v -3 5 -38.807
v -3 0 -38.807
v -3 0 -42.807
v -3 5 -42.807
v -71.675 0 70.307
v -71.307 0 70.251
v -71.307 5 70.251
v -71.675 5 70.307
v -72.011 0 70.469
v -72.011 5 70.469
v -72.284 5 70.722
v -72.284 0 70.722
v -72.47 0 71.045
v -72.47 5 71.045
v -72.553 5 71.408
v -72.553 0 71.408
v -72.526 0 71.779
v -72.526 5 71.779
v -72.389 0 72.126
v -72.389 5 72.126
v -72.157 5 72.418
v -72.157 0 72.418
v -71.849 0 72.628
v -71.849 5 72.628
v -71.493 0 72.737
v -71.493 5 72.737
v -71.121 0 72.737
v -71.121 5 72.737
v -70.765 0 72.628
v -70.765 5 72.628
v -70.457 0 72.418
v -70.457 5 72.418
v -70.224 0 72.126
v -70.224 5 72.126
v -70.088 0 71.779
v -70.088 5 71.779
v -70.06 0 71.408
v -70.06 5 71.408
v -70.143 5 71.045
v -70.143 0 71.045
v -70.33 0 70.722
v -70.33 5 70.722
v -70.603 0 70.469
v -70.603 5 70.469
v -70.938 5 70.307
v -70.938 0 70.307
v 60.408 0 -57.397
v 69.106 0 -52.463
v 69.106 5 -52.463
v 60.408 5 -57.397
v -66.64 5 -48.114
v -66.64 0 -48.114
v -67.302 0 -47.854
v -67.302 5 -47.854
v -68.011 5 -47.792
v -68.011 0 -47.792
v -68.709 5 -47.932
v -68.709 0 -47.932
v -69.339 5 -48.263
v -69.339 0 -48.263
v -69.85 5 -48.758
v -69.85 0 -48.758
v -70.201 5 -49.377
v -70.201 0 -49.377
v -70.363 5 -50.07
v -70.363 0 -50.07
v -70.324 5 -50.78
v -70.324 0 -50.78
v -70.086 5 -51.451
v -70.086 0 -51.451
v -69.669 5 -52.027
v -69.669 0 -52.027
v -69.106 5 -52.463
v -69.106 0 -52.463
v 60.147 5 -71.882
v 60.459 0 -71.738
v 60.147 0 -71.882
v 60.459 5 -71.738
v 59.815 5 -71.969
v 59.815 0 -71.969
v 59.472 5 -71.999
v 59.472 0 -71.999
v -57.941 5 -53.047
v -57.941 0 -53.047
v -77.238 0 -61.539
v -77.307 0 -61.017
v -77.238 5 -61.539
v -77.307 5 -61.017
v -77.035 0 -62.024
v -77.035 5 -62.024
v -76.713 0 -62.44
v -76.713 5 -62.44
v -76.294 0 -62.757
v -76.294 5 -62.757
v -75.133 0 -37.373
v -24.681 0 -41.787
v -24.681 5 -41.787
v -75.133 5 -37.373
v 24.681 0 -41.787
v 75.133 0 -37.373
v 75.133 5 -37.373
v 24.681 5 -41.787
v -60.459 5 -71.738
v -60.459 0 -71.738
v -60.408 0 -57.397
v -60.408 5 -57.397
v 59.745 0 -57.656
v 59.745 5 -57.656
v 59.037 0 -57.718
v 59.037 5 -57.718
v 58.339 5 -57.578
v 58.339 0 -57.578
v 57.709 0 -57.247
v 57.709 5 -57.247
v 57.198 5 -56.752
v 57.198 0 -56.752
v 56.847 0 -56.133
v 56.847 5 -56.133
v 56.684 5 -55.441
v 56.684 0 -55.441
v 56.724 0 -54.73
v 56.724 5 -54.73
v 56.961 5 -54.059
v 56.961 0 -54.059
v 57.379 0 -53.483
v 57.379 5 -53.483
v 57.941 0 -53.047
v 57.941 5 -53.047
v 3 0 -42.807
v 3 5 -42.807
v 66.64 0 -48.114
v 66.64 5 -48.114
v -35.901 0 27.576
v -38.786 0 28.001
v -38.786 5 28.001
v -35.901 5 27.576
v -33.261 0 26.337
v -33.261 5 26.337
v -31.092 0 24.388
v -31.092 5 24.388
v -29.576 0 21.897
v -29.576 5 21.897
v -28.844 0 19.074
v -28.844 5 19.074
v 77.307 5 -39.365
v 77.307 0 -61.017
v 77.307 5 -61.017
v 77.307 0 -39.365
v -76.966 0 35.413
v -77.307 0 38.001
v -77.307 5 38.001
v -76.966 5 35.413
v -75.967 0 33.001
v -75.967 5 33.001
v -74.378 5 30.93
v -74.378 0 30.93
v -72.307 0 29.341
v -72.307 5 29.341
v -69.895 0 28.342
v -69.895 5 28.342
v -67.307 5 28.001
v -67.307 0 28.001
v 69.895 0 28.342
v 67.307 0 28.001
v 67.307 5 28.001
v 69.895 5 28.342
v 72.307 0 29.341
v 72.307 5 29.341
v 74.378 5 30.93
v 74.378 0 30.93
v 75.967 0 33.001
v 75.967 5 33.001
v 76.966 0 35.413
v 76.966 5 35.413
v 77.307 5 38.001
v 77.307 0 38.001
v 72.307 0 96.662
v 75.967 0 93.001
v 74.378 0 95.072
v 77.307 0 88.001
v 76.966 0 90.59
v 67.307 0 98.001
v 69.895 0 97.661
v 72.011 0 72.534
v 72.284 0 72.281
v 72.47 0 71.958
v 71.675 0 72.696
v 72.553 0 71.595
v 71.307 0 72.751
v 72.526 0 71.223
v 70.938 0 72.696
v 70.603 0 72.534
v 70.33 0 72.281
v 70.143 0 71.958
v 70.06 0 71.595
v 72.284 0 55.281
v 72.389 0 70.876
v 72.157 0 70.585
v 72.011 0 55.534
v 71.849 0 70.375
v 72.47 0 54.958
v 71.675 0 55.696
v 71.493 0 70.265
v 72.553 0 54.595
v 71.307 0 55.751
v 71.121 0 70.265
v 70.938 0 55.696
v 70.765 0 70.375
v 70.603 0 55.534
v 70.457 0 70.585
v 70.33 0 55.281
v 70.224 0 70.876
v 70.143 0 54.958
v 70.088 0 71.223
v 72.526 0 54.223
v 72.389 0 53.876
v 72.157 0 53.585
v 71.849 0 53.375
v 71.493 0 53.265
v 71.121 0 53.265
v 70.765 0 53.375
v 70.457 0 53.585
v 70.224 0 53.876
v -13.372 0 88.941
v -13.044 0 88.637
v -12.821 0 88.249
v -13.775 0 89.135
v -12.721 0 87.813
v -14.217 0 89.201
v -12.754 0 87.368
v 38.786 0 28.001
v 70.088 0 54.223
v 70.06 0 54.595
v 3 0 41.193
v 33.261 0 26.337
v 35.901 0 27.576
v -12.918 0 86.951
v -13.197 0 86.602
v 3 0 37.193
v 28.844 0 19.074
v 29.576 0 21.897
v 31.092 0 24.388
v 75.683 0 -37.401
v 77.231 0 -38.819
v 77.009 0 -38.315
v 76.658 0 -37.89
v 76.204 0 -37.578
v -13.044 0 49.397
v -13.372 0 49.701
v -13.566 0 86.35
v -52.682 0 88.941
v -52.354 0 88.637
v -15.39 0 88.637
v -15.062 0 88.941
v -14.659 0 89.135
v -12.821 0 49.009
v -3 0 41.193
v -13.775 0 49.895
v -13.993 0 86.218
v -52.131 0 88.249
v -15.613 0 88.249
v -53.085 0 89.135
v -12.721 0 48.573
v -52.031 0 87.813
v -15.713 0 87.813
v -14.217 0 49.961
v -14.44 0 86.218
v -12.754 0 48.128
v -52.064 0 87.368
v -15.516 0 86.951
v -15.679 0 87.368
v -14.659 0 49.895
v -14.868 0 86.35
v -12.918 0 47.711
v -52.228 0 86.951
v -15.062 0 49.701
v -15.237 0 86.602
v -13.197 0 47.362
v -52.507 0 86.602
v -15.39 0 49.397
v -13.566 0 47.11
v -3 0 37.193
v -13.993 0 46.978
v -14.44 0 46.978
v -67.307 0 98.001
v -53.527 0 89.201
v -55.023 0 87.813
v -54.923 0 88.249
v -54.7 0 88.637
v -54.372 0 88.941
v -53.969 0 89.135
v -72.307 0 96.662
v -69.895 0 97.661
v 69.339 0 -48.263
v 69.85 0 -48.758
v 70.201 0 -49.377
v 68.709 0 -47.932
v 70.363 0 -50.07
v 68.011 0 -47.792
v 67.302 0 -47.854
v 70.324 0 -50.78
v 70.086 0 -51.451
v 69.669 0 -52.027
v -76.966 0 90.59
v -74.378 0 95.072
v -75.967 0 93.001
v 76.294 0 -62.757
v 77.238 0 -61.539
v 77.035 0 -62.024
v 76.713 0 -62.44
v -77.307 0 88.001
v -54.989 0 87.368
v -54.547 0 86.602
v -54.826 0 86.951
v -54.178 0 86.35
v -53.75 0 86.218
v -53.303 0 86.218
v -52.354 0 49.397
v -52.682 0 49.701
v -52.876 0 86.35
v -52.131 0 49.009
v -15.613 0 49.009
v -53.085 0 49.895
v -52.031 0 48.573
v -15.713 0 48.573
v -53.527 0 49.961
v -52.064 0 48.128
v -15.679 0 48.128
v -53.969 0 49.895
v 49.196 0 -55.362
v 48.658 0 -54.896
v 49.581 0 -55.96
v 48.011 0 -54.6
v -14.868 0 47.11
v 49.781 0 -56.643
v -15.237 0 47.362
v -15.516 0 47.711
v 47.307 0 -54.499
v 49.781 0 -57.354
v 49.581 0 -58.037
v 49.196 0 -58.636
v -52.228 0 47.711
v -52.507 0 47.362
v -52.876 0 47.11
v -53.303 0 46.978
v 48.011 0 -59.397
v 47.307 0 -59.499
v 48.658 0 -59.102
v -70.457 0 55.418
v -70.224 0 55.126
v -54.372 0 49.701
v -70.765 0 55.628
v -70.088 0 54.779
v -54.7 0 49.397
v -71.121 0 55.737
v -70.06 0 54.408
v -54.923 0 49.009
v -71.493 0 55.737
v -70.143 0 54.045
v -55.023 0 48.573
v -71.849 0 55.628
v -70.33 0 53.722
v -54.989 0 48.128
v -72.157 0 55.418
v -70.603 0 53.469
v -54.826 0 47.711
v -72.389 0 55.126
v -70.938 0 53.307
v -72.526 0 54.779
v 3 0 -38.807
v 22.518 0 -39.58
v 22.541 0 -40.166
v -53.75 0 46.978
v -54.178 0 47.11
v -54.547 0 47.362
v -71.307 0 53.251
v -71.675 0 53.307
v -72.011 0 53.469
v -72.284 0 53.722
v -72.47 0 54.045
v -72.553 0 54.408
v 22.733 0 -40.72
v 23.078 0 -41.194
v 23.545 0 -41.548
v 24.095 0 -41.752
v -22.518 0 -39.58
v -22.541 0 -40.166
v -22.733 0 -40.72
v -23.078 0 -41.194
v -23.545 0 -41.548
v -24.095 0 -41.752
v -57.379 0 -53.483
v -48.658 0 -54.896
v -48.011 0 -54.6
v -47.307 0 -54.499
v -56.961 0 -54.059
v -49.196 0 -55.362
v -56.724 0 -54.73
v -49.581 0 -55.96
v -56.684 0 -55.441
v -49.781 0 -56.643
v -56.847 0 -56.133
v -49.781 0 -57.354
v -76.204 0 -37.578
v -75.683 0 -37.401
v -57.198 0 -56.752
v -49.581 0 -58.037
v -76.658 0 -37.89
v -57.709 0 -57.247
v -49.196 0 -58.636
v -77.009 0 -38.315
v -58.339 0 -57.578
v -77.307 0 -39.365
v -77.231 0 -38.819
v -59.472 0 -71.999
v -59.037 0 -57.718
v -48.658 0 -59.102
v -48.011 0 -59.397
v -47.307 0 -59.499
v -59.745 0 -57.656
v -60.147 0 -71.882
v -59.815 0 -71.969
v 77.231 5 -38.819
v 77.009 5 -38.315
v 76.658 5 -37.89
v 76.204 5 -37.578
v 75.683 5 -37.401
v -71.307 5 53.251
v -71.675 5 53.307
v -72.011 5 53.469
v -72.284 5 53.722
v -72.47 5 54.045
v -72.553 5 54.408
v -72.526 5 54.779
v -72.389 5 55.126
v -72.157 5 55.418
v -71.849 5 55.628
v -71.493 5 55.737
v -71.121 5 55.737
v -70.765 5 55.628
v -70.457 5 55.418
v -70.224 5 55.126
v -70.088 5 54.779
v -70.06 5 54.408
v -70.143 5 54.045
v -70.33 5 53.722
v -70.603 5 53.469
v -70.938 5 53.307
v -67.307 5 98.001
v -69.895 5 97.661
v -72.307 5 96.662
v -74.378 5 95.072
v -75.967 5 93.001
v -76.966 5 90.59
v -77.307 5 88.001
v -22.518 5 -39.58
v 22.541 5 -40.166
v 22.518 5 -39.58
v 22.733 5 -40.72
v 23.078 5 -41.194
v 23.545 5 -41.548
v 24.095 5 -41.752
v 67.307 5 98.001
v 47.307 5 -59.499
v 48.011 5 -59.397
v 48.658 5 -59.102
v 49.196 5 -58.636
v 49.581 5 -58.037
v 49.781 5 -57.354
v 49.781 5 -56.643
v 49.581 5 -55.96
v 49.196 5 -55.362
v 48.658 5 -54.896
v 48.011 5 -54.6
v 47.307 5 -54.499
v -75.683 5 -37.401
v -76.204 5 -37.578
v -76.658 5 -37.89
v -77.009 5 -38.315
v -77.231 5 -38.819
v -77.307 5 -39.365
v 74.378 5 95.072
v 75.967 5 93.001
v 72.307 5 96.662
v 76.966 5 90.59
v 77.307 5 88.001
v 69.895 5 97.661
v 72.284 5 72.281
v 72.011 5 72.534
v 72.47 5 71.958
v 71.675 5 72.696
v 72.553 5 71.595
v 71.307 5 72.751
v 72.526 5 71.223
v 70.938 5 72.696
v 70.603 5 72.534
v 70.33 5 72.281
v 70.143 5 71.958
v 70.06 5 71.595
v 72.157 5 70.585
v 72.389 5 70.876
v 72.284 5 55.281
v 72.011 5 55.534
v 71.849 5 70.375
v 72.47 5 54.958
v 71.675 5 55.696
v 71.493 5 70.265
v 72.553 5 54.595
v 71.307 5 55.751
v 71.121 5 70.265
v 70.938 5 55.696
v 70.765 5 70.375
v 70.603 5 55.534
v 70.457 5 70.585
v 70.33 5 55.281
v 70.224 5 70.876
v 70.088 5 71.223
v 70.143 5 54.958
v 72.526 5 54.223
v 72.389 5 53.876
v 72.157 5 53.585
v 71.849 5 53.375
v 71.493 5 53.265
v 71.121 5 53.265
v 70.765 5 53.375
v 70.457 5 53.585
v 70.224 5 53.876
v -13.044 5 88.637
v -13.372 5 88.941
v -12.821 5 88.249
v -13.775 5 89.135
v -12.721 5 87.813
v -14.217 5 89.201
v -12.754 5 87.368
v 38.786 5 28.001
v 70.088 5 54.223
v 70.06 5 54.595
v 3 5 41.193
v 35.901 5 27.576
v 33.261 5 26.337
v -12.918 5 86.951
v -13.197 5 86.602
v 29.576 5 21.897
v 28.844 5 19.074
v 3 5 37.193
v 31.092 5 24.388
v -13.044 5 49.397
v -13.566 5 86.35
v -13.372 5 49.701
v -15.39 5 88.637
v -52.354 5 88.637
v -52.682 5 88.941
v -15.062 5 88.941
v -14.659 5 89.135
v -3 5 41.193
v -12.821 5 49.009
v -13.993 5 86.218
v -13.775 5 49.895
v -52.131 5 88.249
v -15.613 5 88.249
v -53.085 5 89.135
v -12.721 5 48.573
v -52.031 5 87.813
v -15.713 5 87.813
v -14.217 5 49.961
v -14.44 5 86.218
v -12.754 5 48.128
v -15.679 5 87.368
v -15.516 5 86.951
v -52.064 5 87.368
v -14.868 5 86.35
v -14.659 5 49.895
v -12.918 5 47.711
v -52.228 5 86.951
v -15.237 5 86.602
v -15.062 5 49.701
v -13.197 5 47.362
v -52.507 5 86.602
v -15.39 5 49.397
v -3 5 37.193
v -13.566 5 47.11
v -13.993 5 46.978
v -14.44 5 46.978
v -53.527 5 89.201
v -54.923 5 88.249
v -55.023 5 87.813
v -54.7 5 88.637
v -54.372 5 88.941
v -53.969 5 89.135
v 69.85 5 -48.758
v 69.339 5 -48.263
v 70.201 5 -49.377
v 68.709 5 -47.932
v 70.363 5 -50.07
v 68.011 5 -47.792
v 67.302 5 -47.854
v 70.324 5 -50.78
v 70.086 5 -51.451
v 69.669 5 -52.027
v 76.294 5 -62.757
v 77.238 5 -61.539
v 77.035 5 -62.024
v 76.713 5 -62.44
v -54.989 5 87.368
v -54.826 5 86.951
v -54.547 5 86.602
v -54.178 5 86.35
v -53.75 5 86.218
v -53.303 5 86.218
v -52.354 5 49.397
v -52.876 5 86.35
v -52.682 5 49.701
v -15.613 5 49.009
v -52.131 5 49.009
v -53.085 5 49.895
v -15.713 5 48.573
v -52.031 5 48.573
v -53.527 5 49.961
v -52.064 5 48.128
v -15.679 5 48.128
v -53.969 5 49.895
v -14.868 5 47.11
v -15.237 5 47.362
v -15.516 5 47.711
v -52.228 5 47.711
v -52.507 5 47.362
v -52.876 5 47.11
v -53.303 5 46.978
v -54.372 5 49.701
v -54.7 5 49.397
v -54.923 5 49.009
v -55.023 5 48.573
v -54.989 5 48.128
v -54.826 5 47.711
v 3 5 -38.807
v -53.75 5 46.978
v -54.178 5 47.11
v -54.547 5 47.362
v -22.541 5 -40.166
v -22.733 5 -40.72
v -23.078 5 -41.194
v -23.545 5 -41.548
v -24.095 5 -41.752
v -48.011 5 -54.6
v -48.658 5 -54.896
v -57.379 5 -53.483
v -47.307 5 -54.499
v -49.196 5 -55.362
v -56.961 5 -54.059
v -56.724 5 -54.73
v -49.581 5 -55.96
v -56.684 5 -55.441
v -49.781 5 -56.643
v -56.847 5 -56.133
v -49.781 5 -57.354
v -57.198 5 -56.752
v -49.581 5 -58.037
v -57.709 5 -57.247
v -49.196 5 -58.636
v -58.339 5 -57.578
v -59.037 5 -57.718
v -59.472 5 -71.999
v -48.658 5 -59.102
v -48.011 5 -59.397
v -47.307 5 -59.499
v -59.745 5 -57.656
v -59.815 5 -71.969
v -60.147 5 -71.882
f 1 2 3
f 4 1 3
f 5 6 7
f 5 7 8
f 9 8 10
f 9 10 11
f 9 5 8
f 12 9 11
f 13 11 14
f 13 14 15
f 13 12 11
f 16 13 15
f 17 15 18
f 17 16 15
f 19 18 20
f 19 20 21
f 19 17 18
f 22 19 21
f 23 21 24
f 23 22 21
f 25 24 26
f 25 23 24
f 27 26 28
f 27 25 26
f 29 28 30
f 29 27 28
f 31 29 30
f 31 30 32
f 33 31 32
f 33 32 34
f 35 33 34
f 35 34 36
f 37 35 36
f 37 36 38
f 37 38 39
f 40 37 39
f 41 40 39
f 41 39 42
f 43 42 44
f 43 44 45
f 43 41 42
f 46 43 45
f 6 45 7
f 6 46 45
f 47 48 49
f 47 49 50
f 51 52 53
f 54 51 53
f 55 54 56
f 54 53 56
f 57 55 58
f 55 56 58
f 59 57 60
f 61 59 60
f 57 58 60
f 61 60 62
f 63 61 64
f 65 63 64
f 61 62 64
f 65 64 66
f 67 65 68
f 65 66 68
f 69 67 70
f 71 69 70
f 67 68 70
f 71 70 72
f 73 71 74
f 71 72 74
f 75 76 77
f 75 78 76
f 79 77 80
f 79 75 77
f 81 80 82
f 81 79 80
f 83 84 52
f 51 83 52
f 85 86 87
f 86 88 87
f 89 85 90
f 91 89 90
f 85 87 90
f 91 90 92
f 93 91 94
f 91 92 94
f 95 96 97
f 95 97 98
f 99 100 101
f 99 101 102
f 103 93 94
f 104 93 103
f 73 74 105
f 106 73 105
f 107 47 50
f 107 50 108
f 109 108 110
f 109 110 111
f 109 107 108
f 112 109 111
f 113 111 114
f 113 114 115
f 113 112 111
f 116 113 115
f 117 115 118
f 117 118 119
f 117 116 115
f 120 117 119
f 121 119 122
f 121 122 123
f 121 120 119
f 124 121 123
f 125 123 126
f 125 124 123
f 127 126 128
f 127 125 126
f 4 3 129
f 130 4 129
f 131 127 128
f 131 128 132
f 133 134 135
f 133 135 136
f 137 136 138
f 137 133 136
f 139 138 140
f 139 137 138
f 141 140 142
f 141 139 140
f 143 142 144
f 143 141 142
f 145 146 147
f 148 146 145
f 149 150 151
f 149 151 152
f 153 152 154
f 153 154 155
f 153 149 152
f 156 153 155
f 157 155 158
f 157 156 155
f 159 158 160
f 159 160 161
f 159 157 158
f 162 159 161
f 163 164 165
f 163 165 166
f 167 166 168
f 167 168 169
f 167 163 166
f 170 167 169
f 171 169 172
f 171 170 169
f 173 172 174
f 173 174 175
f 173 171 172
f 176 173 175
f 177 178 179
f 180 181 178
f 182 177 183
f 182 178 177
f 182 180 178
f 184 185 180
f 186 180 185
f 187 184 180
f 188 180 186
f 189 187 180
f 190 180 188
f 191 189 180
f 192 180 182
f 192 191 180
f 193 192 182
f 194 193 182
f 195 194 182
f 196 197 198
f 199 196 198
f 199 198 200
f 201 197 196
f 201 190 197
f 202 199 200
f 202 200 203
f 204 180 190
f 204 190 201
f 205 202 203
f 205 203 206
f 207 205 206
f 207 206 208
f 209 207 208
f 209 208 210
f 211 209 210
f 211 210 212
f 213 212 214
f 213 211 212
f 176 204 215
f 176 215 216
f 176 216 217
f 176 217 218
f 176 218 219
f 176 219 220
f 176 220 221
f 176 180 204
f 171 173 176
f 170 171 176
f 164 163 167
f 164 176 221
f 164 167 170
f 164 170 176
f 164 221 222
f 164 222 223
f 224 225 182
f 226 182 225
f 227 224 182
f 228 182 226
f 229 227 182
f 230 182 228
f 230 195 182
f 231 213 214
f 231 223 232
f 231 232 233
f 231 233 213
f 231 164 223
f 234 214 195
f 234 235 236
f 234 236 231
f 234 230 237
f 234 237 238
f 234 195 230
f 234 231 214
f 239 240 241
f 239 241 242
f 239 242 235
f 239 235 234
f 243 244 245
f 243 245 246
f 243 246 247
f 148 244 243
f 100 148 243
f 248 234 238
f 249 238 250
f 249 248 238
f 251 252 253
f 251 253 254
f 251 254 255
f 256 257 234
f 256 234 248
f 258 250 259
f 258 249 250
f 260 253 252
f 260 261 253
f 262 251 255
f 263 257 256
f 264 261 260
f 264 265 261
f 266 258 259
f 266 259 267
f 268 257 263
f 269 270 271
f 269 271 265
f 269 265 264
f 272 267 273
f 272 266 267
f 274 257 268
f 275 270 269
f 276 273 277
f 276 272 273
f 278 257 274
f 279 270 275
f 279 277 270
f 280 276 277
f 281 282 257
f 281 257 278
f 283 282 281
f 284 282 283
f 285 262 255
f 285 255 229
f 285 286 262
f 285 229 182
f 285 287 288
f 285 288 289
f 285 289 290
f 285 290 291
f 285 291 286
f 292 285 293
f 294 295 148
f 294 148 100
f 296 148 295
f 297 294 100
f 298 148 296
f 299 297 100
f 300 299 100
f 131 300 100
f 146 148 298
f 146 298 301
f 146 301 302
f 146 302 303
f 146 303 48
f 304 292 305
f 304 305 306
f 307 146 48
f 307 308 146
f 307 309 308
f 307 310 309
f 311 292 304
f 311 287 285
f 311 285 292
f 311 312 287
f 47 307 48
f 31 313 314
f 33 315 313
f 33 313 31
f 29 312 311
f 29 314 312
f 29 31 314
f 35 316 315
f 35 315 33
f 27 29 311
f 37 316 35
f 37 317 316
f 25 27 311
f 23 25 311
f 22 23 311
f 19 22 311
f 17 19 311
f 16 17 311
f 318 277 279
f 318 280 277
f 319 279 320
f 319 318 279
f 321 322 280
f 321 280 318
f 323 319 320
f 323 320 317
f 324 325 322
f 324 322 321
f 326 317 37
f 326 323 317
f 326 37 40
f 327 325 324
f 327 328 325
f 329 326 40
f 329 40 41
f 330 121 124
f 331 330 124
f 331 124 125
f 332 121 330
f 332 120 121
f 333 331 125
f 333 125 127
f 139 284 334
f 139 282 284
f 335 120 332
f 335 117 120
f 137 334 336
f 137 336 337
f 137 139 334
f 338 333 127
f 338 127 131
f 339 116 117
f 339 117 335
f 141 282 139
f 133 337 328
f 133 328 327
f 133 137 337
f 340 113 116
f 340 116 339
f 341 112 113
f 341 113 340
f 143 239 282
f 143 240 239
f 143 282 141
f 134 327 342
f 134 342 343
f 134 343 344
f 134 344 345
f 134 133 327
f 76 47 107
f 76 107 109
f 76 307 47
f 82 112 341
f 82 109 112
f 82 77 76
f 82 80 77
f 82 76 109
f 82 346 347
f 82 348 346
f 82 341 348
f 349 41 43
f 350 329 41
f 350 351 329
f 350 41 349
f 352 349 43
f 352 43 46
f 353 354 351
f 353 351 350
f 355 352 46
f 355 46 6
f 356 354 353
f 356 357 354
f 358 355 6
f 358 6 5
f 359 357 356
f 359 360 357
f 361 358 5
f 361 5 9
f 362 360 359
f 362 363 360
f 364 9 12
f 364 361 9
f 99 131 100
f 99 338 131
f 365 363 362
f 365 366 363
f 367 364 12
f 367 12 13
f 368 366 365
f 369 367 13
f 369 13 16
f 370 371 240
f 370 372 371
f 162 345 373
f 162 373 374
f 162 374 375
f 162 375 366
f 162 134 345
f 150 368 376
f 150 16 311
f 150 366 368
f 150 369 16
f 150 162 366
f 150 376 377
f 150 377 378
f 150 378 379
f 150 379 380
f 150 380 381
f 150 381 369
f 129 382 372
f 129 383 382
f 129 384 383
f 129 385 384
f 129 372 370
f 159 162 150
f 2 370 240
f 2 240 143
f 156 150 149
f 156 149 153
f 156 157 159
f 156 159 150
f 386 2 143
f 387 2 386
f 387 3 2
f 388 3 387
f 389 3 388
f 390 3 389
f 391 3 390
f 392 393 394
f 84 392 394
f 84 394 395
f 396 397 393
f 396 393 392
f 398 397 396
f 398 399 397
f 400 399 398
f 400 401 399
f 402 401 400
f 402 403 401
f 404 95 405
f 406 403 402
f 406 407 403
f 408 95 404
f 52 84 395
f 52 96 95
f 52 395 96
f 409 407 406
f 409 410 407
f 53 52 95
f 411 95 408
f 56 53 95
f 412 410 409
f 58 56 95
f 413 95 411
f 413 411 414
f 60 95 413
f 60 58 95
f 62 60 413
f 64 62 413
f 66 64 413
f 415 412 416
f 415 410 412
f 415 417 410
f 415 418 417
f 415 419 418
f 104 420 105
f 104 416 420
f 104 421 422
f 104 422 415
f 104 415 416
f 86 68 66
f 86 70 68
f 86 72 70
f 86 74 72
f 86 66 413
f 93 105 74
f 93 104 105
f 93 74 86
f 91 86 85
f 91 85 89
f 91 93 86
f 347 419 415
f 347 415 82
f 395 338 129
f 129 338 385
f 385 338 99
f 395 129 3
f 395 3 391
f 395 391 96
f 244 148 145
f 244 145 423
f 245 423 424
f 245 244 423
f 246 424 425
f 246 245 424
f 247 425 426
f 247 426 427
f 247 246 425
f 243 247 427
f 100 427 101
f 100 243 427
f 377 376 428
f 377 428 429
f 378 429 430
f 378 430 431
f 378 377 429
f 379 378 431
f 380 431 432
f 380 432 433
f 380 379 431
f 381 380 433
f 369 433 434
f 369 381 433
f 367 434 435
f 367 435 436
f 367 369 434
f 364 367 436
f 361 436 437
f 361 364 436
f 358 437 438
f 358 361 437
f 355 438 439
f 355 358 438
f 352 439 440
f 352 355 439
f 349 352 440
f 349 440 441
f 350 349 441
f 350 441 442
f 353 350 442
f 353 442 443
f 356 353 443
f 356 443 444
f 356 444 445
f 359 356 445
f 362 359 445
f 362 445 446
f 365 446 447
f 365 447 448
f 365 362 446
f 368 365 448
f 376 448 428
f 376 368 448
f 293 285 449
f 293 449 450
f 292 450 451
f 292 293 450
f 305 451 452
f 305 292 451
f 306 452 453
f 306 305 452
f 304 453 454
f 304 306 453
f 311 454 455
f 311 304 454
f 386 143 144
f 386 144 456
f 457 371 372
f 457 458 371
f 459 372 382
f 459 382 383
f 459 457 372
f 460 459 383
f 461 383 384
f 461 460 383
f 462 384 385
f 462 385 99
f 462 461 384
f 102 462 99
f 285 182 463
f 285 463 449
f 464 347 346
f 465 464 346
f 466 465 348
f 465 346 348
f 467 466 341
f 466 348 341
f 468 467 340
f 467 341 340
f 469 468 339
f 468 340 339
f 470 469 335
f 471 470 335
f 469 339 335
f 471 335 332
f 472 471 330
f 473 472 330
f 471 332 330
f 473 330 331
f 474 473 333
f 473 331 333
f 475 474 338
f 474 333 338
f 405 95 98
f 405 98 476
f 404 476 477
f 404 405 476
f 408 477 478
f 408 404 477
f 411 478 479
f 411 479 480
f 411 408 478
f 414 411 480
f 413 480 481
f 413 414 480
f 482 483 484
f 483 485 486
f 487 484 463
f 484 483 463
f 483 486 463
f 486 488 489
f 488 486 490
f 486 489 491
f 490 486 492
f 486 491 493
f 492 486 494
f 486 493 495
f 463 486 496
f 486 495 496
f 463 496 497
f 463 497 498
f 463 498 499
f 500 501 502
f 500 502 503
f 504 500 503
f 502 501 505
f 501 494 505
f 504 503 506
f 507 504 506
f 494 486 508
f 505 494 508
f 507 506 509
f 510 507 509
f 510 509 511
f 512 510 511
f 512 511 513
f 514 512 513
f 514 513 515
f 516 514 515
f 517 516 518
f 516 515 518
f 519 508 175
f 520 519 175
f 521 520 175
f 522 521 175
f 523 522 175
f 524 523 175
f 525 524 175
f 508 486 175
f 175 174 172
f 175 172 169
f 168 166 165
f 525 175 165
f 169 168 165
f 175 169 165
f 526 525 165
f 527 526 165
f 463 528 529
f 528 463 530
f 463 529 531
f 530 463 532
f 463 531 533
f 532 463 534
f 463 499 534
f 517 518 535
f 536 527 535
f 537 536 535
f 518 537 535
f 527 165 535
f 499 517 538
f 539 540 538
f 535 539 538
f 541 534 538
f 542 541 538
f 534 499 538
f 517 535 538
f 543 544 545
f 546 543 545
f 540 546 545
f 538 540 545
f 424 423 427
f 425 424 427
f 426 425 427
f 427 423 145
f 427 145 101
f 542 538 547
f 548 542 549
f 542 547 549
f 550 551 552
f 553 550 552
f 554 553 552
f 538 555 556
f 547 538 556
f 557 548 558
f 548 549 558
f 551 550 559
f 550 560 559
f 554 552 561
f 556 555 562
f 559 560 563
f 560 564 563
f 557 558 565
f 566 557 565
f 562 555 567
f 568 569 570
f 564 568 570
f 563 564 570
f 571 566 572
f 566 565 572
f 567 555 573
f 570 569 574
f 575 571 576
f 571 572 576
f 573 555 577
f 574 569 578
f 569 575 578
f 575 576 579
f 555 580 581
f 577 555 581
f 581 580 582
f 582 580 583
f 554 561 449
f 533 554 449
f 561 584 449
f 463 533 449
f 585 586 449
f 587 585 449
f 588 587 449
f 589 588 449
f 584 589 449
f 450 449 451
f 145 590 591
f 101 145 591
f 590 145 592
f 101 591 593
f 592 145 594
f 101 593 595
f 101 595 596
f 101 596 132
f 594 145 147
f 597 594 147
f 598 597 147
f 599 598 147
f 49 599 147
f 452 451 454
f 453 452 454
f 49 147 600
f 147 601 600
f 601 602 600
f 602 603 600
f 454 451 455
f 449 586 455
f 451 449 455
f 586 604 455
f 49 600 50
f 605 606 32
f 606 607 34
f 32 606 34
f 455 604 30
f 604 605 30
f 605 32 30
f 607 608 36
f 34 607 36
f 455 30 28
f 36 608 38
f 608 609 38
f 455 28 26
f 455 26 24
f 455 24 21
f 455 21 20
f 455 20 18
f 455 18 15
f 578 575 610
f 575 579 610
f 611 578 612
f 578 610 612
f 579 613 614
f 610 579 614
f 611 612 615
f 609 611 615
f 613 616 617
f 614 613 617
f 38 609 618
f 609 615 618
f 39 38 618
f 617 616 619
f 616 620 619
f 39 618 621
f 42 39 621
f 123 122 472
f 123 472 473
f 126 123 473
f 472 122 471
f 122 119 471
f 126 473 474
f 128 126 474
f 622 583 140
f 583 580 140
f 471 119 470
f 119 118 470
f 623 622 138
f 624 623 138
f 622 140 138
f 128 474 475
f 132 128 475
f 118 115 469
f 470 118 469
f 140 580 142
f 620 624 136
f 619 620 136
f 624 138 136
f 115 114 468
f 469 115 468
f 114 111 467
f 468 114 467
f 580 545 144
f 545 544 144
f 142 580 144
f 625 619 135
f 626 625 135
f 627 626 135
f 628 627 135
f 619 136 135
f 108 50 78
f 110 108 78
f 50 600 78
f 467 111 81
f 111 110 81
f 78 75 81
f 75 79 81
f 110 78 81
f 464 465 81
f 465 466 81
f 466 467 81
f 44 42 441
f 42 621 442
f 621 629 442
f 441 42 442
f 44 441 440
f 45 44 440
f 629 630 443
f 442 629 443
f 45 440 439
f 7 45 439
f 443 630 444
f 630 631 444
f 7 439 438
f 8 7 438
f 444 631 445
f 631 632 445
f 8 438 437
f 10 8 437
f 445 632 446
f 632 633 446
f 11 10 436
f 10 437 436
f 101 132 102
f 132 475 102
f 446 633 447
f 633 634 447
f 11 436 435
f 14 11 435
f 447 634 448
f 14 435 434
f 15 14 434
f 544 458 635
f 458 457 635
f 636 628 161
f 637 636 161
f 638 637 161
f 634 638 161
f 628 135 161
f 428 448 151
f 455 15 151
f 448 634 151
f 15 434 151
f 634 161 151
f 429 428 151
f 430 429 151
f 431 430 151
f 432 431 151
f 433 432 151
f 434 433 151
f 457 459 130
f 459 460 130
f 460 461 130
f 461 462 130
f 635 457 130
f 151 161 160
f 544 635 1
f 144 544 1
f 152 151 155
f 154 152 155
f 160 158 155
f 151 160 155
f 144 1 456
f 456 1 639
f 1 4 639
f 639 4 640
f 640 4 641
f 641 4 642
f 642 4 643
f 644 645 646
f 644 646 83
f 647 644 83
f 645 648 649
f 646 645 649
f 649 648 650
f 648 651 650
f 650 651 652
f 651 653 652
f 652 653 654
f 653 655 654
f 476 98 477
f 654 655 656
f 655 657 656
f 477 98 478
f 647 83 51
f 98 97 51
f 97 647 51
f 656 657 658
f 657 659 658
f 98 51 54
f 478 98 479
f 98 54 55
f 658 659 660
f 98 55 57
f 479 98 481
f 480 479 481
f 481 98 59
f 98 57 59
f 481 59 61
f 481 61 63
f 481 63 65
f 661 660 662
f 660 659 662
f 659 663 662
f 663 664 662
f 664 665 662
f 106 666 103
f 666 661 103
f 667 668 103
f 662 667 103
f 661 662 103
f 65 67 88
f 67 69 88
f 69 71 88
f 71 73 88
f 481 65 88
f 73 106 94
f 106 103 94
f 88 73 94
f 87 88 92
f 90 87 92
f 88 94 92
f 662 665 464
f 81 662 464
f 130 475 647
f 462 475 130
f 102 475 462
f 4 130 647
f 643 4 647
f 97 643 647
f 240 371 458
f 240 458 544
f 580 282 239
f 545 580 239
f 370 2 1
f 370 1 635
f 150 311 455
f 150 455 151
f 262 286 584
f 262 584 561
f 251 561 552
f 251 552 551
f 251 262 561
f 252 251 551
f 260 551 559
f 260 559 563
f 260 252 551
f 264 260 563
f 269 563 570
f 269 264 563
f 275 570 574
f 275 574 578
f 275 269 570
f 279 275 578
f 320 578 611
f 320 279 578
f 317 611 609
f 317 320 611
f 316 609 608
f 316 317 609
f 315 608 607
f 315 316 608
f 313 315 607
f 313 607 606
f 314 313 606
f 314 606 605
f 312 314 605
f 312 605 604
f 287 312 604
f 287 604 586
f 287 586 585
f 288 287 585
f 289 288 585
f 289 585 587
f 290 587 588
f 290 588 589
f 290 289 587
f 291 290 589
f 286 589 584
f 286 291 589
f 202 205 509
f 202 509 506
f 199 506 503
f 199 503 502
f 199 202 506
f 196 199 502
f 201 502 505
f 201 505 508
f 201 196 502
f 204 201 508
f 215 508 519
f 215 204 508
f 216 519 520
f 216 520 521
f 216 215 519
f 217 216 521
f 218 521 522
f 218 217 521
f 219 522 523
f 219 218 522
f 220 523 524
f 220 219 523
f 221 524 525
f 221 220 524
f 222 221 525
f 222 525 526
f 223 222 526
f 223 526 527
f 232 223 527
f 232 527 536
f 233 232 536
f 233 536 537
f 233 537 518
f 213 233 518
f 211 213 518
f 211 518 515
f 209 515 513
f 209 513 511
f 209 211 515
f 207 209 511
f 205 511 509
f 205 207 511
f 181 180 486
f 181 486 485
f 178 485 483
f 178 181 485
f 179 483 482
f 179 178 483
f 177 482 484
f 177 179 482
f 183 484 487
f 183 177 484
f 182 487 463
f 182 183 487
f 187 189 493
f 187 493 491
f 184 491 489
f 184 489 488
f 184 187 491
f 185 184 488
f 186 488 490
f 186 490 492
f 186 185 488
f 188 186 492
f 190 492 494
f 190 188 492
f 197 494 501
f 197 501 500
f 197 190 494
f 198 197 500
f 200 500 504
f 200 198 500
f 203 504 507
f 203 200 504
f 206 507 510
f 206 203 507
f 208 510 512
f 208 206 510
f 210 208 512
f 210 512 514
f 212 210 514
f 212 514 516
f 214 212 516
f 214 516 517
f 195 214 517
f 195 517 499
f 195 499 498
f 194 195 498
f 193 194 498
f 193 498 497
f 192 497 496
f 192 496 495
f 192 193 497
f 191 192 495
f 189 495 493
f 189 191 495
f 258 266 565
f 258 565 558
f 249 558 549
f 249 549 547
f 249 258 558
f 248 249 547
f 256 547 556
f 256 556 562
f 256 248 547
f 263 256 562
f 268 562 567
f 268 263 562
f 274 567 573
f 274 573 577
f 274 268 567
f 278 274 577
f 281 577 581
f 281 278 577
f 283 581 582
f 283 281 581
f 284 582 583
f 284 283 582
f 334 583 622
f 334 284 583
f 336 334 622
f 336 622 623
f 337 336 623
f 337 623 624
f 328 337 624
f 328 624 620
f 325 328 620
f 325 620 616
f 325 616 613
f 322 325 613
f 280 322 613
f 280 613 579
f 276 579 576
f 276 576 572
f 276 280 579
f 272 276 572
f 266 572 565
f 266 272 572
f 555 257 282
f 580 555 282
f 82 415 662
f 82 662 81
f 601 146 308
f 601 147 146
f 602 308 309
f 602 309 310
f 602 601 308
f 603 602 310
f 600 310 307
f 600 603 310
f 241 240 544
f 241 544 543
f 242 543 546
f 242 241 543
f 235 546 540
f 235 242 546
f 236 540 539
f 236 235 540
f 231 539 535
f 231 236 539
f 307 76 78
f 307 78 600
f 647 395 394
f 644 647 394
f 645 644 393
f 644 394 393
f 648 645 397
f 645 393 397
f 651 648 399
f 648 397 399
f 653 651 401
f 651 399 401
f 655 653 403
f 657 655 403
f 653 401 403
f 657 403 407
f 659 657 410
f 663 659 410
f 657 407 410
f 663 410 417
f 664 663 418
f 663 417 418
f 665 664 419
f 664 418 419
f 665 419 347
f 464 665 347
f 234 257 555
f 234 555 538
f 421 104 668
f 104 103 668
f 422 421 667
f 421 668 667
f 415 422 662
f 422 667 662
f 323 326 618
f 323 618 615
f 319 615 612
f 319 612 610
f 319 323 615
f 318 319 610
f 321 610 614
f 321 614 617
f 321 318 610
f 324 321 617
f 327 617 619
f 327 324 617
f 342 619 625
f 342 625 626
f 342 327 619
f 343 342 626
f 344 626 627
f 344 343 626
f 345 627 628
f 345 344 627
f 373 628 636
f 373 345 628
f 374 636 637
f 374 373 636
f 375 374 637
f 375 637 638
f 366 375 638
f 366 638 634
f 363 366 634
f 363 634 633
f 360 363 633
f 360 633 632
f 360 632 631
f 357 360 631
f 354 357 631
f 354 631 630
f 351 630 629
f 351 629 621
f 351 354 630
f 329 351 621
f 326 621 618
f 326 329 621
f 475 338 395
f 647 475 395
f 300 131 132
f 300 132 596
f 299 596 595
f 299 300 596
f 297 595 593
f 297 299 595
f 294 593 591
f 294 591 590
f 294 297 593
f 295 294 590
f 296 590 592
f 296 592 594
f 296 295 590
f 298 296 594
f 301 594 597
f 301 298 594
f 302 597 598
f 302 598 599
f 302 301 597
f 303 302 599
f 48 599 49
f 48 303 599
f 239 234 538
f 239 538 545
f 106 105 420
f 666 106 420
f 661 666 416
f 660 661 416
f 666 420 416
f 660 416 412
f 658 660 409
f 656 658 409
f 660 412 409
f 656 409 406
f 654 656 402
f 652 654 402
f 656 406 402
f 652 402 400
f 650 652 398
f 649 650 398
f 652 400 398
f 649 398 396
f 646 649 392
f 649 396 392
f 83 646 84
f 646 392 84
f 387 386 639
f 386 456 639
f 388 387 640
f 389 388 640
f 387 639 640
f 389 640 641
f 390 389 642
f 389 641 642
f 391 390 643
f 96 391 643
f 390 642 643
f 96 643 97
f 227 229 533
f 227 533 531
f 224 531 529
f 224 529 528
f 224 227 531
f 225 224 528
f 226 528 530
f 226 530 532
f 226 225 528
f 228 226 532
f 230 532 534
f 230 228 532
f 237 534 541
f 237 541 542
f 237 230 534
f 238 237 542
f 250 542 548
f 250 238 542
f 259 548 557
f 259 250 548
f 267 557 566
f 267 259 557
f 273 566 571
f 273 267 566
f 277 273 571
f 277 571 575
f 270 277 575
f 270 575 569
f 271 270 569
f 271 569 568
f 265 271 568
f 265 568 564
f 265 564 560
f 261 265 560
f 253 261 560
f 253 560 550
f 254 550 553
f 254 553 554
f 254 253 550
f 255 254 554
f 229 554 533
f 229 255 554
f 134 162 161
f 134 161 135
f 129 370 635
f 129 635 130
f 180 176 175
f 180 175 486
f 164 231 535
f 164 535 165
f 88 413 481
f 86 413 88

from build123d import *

# Parameters (mm, degrees)
SKETCH4_R           = 1.25
SKETCH4_R_2         = 1.5
SKETCH4_W           = 6
SKETCH4_H           = 4
BOSS_EXTRUDE1_DEPTH = 5
FILLET2_R           = 2


with BuildPart() as part:
    # Sketch4 → Boss-Extrude1 (new body)
    with BuildSketch(Plane(origin=(0, 0, 0), x_dir=(1, 0, 0), z_dir=(0, 1, 0))):
        with BuildLine():
            Line((67.306888039, -98.001348092), (-67.306888039, -98.001348092))
            ThreePointArc((-67.306888039, -98.001348092), (-74.37795585, -95.072415903), (-77.306888039, -88.001348092))
            Line((-77.306888039, -88.001348092), (-77.306888039, -38.001348092))
            ThreePointArc((-77.306888039, -38.001348092), (-74.37795585, -30.93028028), (-67.306888039, -28.001348092))
            Line((-67.306888039, -28.001348092), (-38.78630833, -28.001348092))
            ThreePointArc((-38.78630833, -28.001348092), (-32.105125256, -25.441898658), (-28.843972229, -19.073706639))
            Line((-28.843972229, -19.073706639), (-22.256841696, 41.998651908))
            Line((-22.256841696, 41.998651908), (-75.132576553, 37.372624533))
            ThreePointArc((-75.132576553, 37.372624533), (-76.658068454, 37.890459255), (-77.306888039, 39.365013929))
            Line((-77.306888039, 39.365013929), (-77.306888039, 62.182396927))
            Line((-77.306888039, 62.182396927), (-60, 71.998651908))
            Line((-60, 71.998651908), (60, 71.998651908))
            Line((60, 71.998651908), (77.306888039, 62.182396927))
            Line((77.306888039, 62.182396927), (77.306888039, 39.365013929))
            ThreePointArc((77.306888039, 39.365013929), (76.658068454, 37.890459255), (75.132576553, 37.372624533))
            Line((75.132576553, 37.372624533), (22.256841696, 41.998651908))
            Line((22.256841696, 41.998651908), (28.843972229, -19.073706639))
            ThreePointArc((28.843972229, -19.073706639), (32.105125256, -25.441898658), (38.78630833, -28.001348092))
            Line((38.78630833, -28.001348092), (67.306888039, -28.001348092))
            ThreePointArc((67.306888039, -28.001348092), (74.37795585, -30.93028028), (77.306888039, -38.001348092))
            Line((77.306888039, -38.001348092), (77.306888039, -88.001348092))
            ThreePointArc((77.306888039, -88.001348092), (74.37795585, -95.072415903), (67.306888039, -98.001348092))
        make_face()
        with Locations(Location((71.306888039, -54.501348092, 0), (0, 0, 270))):
            Circle(SKETCH4_R, mode=Mode.SUBTRACT)
        with Locations(Location((71.306888039, -71.501348092, 0), (0, 0, 270))):
            Circle(SKETCH4_R, mode=Mode.SUBTRACT)
        with Locations(Location((-71.306888039, -71.501348092, 0), (0, 0, 90))):
            Circle(SKETCH4_R, mode=Mode.SUBTRACT)
        with Locations(Location((-71.306888039, -54.501348092, 0), (0, 0, 90))):
            Circle(SKETCH4_R, mode=Mode.SUBTRACT)
        with Locations(Location((-53.526888039, -87.701348092, 0), (0, 0, 270))):
            Circle(SKETCH4_R_2, mode=Mode.SUBTRACT)
        with Locations(Location((-53.526888039, -48.461348092, 0), (0, 0, 270))):
            Circle(SKETCH4_R_2, mode=Mode.SUBTRACT)
        with Locations(Location((-14.216888039, -48.461348092, 0), (0, 0, 270))):
            Circle(SKETCH4_R_2, mode=Mode.SUBTRACT)
        with Locations(Location((-14.216888039, -87.701348092, 0), (0, 0, 270))):
            Circle(SKETCH4_R_2, mode=Mode.SUBTRACT)
        with BuildLine():
            Line((-47.306888039, 59.498651908), (47.306888039, 59.498651908))
            ThreePointArc((47.306888039, 59.498651908), (49.806888039, 56.998651908), (47.306888039, 54.498651908))
            Line((47.306888039, 54.498651908), (-47.306888039, 54.498651908))
            ThreePointArc((-47.306888039, 54.498651908), (-49.806888039, 56.998651908), (-47.306888039, 59.498651908))
        make_face(mode=Mode.SUBTRACT)
        with BuildLine():
            Line((-57.941248655, 53.047423499), (-66.639525671, 48.113867281))
            ThreePointArc((-66.639525671, 48.113867281), (-70.047483979, 49.055047481), (-69.10630378, 52.463005789))
            Line((-69.10630378, 52.463005789), (-60.408026764, 57.396562007))
            ThreePointArc((-60.408026764, 57.396562007), (-57.000068455, 56.455381807), (-57.941248655, 53.047423499))
        make_face(mode=Mode.SUBTRACT)
        with BuildLine():
            Line((57.941248655, 53.047423499), (66.639525671, 48.113867281))
            ThreePointArc((66.639525671, 48.113867281), (70.047483979, 49.055047481), (69.10630378, 52.463005789))
            Line((69.10630378, 52.463005789), (60.408026764, 57.396562007))
            ThreePointArc((60.408026764, 57.396562007), (57.000068455, 56.455381807), (57.941248655, 53.047423499))
        make_face(mode=Mode.SUBTRACT)
        with Locations((0, 40.807207385)):
            Rectangle(SKETCH4_W, SKETCH4_H, mode=Mode.SUBTRACT)
        with Locations((0, -39.192792615)):
            Rectangle(SKETCH4_W, SKETCH4_H, mode=Mode.SUBTRACT)
    extrude(amount=BOSS_EXTRUDE1_DEPTH)

    # Fillet2
    fillet2_edges = [part.edges().sort_by_distance(p)[0] for p in [
        (-22.256841696, 2.5, -41.998651908),
        (-77.306888039, 2.5, -62.182396927),
        (-60, 2.5, -71.998651908),
        (60, 2.5, -71.998651908),
        (77.306888039, 2.5, -62.182396927),
        (22.256841696, 2.5, -41.998651908),
    ]]
    fillet(fillet2_edges, radius=FILLET2_R)


solid = part.part
